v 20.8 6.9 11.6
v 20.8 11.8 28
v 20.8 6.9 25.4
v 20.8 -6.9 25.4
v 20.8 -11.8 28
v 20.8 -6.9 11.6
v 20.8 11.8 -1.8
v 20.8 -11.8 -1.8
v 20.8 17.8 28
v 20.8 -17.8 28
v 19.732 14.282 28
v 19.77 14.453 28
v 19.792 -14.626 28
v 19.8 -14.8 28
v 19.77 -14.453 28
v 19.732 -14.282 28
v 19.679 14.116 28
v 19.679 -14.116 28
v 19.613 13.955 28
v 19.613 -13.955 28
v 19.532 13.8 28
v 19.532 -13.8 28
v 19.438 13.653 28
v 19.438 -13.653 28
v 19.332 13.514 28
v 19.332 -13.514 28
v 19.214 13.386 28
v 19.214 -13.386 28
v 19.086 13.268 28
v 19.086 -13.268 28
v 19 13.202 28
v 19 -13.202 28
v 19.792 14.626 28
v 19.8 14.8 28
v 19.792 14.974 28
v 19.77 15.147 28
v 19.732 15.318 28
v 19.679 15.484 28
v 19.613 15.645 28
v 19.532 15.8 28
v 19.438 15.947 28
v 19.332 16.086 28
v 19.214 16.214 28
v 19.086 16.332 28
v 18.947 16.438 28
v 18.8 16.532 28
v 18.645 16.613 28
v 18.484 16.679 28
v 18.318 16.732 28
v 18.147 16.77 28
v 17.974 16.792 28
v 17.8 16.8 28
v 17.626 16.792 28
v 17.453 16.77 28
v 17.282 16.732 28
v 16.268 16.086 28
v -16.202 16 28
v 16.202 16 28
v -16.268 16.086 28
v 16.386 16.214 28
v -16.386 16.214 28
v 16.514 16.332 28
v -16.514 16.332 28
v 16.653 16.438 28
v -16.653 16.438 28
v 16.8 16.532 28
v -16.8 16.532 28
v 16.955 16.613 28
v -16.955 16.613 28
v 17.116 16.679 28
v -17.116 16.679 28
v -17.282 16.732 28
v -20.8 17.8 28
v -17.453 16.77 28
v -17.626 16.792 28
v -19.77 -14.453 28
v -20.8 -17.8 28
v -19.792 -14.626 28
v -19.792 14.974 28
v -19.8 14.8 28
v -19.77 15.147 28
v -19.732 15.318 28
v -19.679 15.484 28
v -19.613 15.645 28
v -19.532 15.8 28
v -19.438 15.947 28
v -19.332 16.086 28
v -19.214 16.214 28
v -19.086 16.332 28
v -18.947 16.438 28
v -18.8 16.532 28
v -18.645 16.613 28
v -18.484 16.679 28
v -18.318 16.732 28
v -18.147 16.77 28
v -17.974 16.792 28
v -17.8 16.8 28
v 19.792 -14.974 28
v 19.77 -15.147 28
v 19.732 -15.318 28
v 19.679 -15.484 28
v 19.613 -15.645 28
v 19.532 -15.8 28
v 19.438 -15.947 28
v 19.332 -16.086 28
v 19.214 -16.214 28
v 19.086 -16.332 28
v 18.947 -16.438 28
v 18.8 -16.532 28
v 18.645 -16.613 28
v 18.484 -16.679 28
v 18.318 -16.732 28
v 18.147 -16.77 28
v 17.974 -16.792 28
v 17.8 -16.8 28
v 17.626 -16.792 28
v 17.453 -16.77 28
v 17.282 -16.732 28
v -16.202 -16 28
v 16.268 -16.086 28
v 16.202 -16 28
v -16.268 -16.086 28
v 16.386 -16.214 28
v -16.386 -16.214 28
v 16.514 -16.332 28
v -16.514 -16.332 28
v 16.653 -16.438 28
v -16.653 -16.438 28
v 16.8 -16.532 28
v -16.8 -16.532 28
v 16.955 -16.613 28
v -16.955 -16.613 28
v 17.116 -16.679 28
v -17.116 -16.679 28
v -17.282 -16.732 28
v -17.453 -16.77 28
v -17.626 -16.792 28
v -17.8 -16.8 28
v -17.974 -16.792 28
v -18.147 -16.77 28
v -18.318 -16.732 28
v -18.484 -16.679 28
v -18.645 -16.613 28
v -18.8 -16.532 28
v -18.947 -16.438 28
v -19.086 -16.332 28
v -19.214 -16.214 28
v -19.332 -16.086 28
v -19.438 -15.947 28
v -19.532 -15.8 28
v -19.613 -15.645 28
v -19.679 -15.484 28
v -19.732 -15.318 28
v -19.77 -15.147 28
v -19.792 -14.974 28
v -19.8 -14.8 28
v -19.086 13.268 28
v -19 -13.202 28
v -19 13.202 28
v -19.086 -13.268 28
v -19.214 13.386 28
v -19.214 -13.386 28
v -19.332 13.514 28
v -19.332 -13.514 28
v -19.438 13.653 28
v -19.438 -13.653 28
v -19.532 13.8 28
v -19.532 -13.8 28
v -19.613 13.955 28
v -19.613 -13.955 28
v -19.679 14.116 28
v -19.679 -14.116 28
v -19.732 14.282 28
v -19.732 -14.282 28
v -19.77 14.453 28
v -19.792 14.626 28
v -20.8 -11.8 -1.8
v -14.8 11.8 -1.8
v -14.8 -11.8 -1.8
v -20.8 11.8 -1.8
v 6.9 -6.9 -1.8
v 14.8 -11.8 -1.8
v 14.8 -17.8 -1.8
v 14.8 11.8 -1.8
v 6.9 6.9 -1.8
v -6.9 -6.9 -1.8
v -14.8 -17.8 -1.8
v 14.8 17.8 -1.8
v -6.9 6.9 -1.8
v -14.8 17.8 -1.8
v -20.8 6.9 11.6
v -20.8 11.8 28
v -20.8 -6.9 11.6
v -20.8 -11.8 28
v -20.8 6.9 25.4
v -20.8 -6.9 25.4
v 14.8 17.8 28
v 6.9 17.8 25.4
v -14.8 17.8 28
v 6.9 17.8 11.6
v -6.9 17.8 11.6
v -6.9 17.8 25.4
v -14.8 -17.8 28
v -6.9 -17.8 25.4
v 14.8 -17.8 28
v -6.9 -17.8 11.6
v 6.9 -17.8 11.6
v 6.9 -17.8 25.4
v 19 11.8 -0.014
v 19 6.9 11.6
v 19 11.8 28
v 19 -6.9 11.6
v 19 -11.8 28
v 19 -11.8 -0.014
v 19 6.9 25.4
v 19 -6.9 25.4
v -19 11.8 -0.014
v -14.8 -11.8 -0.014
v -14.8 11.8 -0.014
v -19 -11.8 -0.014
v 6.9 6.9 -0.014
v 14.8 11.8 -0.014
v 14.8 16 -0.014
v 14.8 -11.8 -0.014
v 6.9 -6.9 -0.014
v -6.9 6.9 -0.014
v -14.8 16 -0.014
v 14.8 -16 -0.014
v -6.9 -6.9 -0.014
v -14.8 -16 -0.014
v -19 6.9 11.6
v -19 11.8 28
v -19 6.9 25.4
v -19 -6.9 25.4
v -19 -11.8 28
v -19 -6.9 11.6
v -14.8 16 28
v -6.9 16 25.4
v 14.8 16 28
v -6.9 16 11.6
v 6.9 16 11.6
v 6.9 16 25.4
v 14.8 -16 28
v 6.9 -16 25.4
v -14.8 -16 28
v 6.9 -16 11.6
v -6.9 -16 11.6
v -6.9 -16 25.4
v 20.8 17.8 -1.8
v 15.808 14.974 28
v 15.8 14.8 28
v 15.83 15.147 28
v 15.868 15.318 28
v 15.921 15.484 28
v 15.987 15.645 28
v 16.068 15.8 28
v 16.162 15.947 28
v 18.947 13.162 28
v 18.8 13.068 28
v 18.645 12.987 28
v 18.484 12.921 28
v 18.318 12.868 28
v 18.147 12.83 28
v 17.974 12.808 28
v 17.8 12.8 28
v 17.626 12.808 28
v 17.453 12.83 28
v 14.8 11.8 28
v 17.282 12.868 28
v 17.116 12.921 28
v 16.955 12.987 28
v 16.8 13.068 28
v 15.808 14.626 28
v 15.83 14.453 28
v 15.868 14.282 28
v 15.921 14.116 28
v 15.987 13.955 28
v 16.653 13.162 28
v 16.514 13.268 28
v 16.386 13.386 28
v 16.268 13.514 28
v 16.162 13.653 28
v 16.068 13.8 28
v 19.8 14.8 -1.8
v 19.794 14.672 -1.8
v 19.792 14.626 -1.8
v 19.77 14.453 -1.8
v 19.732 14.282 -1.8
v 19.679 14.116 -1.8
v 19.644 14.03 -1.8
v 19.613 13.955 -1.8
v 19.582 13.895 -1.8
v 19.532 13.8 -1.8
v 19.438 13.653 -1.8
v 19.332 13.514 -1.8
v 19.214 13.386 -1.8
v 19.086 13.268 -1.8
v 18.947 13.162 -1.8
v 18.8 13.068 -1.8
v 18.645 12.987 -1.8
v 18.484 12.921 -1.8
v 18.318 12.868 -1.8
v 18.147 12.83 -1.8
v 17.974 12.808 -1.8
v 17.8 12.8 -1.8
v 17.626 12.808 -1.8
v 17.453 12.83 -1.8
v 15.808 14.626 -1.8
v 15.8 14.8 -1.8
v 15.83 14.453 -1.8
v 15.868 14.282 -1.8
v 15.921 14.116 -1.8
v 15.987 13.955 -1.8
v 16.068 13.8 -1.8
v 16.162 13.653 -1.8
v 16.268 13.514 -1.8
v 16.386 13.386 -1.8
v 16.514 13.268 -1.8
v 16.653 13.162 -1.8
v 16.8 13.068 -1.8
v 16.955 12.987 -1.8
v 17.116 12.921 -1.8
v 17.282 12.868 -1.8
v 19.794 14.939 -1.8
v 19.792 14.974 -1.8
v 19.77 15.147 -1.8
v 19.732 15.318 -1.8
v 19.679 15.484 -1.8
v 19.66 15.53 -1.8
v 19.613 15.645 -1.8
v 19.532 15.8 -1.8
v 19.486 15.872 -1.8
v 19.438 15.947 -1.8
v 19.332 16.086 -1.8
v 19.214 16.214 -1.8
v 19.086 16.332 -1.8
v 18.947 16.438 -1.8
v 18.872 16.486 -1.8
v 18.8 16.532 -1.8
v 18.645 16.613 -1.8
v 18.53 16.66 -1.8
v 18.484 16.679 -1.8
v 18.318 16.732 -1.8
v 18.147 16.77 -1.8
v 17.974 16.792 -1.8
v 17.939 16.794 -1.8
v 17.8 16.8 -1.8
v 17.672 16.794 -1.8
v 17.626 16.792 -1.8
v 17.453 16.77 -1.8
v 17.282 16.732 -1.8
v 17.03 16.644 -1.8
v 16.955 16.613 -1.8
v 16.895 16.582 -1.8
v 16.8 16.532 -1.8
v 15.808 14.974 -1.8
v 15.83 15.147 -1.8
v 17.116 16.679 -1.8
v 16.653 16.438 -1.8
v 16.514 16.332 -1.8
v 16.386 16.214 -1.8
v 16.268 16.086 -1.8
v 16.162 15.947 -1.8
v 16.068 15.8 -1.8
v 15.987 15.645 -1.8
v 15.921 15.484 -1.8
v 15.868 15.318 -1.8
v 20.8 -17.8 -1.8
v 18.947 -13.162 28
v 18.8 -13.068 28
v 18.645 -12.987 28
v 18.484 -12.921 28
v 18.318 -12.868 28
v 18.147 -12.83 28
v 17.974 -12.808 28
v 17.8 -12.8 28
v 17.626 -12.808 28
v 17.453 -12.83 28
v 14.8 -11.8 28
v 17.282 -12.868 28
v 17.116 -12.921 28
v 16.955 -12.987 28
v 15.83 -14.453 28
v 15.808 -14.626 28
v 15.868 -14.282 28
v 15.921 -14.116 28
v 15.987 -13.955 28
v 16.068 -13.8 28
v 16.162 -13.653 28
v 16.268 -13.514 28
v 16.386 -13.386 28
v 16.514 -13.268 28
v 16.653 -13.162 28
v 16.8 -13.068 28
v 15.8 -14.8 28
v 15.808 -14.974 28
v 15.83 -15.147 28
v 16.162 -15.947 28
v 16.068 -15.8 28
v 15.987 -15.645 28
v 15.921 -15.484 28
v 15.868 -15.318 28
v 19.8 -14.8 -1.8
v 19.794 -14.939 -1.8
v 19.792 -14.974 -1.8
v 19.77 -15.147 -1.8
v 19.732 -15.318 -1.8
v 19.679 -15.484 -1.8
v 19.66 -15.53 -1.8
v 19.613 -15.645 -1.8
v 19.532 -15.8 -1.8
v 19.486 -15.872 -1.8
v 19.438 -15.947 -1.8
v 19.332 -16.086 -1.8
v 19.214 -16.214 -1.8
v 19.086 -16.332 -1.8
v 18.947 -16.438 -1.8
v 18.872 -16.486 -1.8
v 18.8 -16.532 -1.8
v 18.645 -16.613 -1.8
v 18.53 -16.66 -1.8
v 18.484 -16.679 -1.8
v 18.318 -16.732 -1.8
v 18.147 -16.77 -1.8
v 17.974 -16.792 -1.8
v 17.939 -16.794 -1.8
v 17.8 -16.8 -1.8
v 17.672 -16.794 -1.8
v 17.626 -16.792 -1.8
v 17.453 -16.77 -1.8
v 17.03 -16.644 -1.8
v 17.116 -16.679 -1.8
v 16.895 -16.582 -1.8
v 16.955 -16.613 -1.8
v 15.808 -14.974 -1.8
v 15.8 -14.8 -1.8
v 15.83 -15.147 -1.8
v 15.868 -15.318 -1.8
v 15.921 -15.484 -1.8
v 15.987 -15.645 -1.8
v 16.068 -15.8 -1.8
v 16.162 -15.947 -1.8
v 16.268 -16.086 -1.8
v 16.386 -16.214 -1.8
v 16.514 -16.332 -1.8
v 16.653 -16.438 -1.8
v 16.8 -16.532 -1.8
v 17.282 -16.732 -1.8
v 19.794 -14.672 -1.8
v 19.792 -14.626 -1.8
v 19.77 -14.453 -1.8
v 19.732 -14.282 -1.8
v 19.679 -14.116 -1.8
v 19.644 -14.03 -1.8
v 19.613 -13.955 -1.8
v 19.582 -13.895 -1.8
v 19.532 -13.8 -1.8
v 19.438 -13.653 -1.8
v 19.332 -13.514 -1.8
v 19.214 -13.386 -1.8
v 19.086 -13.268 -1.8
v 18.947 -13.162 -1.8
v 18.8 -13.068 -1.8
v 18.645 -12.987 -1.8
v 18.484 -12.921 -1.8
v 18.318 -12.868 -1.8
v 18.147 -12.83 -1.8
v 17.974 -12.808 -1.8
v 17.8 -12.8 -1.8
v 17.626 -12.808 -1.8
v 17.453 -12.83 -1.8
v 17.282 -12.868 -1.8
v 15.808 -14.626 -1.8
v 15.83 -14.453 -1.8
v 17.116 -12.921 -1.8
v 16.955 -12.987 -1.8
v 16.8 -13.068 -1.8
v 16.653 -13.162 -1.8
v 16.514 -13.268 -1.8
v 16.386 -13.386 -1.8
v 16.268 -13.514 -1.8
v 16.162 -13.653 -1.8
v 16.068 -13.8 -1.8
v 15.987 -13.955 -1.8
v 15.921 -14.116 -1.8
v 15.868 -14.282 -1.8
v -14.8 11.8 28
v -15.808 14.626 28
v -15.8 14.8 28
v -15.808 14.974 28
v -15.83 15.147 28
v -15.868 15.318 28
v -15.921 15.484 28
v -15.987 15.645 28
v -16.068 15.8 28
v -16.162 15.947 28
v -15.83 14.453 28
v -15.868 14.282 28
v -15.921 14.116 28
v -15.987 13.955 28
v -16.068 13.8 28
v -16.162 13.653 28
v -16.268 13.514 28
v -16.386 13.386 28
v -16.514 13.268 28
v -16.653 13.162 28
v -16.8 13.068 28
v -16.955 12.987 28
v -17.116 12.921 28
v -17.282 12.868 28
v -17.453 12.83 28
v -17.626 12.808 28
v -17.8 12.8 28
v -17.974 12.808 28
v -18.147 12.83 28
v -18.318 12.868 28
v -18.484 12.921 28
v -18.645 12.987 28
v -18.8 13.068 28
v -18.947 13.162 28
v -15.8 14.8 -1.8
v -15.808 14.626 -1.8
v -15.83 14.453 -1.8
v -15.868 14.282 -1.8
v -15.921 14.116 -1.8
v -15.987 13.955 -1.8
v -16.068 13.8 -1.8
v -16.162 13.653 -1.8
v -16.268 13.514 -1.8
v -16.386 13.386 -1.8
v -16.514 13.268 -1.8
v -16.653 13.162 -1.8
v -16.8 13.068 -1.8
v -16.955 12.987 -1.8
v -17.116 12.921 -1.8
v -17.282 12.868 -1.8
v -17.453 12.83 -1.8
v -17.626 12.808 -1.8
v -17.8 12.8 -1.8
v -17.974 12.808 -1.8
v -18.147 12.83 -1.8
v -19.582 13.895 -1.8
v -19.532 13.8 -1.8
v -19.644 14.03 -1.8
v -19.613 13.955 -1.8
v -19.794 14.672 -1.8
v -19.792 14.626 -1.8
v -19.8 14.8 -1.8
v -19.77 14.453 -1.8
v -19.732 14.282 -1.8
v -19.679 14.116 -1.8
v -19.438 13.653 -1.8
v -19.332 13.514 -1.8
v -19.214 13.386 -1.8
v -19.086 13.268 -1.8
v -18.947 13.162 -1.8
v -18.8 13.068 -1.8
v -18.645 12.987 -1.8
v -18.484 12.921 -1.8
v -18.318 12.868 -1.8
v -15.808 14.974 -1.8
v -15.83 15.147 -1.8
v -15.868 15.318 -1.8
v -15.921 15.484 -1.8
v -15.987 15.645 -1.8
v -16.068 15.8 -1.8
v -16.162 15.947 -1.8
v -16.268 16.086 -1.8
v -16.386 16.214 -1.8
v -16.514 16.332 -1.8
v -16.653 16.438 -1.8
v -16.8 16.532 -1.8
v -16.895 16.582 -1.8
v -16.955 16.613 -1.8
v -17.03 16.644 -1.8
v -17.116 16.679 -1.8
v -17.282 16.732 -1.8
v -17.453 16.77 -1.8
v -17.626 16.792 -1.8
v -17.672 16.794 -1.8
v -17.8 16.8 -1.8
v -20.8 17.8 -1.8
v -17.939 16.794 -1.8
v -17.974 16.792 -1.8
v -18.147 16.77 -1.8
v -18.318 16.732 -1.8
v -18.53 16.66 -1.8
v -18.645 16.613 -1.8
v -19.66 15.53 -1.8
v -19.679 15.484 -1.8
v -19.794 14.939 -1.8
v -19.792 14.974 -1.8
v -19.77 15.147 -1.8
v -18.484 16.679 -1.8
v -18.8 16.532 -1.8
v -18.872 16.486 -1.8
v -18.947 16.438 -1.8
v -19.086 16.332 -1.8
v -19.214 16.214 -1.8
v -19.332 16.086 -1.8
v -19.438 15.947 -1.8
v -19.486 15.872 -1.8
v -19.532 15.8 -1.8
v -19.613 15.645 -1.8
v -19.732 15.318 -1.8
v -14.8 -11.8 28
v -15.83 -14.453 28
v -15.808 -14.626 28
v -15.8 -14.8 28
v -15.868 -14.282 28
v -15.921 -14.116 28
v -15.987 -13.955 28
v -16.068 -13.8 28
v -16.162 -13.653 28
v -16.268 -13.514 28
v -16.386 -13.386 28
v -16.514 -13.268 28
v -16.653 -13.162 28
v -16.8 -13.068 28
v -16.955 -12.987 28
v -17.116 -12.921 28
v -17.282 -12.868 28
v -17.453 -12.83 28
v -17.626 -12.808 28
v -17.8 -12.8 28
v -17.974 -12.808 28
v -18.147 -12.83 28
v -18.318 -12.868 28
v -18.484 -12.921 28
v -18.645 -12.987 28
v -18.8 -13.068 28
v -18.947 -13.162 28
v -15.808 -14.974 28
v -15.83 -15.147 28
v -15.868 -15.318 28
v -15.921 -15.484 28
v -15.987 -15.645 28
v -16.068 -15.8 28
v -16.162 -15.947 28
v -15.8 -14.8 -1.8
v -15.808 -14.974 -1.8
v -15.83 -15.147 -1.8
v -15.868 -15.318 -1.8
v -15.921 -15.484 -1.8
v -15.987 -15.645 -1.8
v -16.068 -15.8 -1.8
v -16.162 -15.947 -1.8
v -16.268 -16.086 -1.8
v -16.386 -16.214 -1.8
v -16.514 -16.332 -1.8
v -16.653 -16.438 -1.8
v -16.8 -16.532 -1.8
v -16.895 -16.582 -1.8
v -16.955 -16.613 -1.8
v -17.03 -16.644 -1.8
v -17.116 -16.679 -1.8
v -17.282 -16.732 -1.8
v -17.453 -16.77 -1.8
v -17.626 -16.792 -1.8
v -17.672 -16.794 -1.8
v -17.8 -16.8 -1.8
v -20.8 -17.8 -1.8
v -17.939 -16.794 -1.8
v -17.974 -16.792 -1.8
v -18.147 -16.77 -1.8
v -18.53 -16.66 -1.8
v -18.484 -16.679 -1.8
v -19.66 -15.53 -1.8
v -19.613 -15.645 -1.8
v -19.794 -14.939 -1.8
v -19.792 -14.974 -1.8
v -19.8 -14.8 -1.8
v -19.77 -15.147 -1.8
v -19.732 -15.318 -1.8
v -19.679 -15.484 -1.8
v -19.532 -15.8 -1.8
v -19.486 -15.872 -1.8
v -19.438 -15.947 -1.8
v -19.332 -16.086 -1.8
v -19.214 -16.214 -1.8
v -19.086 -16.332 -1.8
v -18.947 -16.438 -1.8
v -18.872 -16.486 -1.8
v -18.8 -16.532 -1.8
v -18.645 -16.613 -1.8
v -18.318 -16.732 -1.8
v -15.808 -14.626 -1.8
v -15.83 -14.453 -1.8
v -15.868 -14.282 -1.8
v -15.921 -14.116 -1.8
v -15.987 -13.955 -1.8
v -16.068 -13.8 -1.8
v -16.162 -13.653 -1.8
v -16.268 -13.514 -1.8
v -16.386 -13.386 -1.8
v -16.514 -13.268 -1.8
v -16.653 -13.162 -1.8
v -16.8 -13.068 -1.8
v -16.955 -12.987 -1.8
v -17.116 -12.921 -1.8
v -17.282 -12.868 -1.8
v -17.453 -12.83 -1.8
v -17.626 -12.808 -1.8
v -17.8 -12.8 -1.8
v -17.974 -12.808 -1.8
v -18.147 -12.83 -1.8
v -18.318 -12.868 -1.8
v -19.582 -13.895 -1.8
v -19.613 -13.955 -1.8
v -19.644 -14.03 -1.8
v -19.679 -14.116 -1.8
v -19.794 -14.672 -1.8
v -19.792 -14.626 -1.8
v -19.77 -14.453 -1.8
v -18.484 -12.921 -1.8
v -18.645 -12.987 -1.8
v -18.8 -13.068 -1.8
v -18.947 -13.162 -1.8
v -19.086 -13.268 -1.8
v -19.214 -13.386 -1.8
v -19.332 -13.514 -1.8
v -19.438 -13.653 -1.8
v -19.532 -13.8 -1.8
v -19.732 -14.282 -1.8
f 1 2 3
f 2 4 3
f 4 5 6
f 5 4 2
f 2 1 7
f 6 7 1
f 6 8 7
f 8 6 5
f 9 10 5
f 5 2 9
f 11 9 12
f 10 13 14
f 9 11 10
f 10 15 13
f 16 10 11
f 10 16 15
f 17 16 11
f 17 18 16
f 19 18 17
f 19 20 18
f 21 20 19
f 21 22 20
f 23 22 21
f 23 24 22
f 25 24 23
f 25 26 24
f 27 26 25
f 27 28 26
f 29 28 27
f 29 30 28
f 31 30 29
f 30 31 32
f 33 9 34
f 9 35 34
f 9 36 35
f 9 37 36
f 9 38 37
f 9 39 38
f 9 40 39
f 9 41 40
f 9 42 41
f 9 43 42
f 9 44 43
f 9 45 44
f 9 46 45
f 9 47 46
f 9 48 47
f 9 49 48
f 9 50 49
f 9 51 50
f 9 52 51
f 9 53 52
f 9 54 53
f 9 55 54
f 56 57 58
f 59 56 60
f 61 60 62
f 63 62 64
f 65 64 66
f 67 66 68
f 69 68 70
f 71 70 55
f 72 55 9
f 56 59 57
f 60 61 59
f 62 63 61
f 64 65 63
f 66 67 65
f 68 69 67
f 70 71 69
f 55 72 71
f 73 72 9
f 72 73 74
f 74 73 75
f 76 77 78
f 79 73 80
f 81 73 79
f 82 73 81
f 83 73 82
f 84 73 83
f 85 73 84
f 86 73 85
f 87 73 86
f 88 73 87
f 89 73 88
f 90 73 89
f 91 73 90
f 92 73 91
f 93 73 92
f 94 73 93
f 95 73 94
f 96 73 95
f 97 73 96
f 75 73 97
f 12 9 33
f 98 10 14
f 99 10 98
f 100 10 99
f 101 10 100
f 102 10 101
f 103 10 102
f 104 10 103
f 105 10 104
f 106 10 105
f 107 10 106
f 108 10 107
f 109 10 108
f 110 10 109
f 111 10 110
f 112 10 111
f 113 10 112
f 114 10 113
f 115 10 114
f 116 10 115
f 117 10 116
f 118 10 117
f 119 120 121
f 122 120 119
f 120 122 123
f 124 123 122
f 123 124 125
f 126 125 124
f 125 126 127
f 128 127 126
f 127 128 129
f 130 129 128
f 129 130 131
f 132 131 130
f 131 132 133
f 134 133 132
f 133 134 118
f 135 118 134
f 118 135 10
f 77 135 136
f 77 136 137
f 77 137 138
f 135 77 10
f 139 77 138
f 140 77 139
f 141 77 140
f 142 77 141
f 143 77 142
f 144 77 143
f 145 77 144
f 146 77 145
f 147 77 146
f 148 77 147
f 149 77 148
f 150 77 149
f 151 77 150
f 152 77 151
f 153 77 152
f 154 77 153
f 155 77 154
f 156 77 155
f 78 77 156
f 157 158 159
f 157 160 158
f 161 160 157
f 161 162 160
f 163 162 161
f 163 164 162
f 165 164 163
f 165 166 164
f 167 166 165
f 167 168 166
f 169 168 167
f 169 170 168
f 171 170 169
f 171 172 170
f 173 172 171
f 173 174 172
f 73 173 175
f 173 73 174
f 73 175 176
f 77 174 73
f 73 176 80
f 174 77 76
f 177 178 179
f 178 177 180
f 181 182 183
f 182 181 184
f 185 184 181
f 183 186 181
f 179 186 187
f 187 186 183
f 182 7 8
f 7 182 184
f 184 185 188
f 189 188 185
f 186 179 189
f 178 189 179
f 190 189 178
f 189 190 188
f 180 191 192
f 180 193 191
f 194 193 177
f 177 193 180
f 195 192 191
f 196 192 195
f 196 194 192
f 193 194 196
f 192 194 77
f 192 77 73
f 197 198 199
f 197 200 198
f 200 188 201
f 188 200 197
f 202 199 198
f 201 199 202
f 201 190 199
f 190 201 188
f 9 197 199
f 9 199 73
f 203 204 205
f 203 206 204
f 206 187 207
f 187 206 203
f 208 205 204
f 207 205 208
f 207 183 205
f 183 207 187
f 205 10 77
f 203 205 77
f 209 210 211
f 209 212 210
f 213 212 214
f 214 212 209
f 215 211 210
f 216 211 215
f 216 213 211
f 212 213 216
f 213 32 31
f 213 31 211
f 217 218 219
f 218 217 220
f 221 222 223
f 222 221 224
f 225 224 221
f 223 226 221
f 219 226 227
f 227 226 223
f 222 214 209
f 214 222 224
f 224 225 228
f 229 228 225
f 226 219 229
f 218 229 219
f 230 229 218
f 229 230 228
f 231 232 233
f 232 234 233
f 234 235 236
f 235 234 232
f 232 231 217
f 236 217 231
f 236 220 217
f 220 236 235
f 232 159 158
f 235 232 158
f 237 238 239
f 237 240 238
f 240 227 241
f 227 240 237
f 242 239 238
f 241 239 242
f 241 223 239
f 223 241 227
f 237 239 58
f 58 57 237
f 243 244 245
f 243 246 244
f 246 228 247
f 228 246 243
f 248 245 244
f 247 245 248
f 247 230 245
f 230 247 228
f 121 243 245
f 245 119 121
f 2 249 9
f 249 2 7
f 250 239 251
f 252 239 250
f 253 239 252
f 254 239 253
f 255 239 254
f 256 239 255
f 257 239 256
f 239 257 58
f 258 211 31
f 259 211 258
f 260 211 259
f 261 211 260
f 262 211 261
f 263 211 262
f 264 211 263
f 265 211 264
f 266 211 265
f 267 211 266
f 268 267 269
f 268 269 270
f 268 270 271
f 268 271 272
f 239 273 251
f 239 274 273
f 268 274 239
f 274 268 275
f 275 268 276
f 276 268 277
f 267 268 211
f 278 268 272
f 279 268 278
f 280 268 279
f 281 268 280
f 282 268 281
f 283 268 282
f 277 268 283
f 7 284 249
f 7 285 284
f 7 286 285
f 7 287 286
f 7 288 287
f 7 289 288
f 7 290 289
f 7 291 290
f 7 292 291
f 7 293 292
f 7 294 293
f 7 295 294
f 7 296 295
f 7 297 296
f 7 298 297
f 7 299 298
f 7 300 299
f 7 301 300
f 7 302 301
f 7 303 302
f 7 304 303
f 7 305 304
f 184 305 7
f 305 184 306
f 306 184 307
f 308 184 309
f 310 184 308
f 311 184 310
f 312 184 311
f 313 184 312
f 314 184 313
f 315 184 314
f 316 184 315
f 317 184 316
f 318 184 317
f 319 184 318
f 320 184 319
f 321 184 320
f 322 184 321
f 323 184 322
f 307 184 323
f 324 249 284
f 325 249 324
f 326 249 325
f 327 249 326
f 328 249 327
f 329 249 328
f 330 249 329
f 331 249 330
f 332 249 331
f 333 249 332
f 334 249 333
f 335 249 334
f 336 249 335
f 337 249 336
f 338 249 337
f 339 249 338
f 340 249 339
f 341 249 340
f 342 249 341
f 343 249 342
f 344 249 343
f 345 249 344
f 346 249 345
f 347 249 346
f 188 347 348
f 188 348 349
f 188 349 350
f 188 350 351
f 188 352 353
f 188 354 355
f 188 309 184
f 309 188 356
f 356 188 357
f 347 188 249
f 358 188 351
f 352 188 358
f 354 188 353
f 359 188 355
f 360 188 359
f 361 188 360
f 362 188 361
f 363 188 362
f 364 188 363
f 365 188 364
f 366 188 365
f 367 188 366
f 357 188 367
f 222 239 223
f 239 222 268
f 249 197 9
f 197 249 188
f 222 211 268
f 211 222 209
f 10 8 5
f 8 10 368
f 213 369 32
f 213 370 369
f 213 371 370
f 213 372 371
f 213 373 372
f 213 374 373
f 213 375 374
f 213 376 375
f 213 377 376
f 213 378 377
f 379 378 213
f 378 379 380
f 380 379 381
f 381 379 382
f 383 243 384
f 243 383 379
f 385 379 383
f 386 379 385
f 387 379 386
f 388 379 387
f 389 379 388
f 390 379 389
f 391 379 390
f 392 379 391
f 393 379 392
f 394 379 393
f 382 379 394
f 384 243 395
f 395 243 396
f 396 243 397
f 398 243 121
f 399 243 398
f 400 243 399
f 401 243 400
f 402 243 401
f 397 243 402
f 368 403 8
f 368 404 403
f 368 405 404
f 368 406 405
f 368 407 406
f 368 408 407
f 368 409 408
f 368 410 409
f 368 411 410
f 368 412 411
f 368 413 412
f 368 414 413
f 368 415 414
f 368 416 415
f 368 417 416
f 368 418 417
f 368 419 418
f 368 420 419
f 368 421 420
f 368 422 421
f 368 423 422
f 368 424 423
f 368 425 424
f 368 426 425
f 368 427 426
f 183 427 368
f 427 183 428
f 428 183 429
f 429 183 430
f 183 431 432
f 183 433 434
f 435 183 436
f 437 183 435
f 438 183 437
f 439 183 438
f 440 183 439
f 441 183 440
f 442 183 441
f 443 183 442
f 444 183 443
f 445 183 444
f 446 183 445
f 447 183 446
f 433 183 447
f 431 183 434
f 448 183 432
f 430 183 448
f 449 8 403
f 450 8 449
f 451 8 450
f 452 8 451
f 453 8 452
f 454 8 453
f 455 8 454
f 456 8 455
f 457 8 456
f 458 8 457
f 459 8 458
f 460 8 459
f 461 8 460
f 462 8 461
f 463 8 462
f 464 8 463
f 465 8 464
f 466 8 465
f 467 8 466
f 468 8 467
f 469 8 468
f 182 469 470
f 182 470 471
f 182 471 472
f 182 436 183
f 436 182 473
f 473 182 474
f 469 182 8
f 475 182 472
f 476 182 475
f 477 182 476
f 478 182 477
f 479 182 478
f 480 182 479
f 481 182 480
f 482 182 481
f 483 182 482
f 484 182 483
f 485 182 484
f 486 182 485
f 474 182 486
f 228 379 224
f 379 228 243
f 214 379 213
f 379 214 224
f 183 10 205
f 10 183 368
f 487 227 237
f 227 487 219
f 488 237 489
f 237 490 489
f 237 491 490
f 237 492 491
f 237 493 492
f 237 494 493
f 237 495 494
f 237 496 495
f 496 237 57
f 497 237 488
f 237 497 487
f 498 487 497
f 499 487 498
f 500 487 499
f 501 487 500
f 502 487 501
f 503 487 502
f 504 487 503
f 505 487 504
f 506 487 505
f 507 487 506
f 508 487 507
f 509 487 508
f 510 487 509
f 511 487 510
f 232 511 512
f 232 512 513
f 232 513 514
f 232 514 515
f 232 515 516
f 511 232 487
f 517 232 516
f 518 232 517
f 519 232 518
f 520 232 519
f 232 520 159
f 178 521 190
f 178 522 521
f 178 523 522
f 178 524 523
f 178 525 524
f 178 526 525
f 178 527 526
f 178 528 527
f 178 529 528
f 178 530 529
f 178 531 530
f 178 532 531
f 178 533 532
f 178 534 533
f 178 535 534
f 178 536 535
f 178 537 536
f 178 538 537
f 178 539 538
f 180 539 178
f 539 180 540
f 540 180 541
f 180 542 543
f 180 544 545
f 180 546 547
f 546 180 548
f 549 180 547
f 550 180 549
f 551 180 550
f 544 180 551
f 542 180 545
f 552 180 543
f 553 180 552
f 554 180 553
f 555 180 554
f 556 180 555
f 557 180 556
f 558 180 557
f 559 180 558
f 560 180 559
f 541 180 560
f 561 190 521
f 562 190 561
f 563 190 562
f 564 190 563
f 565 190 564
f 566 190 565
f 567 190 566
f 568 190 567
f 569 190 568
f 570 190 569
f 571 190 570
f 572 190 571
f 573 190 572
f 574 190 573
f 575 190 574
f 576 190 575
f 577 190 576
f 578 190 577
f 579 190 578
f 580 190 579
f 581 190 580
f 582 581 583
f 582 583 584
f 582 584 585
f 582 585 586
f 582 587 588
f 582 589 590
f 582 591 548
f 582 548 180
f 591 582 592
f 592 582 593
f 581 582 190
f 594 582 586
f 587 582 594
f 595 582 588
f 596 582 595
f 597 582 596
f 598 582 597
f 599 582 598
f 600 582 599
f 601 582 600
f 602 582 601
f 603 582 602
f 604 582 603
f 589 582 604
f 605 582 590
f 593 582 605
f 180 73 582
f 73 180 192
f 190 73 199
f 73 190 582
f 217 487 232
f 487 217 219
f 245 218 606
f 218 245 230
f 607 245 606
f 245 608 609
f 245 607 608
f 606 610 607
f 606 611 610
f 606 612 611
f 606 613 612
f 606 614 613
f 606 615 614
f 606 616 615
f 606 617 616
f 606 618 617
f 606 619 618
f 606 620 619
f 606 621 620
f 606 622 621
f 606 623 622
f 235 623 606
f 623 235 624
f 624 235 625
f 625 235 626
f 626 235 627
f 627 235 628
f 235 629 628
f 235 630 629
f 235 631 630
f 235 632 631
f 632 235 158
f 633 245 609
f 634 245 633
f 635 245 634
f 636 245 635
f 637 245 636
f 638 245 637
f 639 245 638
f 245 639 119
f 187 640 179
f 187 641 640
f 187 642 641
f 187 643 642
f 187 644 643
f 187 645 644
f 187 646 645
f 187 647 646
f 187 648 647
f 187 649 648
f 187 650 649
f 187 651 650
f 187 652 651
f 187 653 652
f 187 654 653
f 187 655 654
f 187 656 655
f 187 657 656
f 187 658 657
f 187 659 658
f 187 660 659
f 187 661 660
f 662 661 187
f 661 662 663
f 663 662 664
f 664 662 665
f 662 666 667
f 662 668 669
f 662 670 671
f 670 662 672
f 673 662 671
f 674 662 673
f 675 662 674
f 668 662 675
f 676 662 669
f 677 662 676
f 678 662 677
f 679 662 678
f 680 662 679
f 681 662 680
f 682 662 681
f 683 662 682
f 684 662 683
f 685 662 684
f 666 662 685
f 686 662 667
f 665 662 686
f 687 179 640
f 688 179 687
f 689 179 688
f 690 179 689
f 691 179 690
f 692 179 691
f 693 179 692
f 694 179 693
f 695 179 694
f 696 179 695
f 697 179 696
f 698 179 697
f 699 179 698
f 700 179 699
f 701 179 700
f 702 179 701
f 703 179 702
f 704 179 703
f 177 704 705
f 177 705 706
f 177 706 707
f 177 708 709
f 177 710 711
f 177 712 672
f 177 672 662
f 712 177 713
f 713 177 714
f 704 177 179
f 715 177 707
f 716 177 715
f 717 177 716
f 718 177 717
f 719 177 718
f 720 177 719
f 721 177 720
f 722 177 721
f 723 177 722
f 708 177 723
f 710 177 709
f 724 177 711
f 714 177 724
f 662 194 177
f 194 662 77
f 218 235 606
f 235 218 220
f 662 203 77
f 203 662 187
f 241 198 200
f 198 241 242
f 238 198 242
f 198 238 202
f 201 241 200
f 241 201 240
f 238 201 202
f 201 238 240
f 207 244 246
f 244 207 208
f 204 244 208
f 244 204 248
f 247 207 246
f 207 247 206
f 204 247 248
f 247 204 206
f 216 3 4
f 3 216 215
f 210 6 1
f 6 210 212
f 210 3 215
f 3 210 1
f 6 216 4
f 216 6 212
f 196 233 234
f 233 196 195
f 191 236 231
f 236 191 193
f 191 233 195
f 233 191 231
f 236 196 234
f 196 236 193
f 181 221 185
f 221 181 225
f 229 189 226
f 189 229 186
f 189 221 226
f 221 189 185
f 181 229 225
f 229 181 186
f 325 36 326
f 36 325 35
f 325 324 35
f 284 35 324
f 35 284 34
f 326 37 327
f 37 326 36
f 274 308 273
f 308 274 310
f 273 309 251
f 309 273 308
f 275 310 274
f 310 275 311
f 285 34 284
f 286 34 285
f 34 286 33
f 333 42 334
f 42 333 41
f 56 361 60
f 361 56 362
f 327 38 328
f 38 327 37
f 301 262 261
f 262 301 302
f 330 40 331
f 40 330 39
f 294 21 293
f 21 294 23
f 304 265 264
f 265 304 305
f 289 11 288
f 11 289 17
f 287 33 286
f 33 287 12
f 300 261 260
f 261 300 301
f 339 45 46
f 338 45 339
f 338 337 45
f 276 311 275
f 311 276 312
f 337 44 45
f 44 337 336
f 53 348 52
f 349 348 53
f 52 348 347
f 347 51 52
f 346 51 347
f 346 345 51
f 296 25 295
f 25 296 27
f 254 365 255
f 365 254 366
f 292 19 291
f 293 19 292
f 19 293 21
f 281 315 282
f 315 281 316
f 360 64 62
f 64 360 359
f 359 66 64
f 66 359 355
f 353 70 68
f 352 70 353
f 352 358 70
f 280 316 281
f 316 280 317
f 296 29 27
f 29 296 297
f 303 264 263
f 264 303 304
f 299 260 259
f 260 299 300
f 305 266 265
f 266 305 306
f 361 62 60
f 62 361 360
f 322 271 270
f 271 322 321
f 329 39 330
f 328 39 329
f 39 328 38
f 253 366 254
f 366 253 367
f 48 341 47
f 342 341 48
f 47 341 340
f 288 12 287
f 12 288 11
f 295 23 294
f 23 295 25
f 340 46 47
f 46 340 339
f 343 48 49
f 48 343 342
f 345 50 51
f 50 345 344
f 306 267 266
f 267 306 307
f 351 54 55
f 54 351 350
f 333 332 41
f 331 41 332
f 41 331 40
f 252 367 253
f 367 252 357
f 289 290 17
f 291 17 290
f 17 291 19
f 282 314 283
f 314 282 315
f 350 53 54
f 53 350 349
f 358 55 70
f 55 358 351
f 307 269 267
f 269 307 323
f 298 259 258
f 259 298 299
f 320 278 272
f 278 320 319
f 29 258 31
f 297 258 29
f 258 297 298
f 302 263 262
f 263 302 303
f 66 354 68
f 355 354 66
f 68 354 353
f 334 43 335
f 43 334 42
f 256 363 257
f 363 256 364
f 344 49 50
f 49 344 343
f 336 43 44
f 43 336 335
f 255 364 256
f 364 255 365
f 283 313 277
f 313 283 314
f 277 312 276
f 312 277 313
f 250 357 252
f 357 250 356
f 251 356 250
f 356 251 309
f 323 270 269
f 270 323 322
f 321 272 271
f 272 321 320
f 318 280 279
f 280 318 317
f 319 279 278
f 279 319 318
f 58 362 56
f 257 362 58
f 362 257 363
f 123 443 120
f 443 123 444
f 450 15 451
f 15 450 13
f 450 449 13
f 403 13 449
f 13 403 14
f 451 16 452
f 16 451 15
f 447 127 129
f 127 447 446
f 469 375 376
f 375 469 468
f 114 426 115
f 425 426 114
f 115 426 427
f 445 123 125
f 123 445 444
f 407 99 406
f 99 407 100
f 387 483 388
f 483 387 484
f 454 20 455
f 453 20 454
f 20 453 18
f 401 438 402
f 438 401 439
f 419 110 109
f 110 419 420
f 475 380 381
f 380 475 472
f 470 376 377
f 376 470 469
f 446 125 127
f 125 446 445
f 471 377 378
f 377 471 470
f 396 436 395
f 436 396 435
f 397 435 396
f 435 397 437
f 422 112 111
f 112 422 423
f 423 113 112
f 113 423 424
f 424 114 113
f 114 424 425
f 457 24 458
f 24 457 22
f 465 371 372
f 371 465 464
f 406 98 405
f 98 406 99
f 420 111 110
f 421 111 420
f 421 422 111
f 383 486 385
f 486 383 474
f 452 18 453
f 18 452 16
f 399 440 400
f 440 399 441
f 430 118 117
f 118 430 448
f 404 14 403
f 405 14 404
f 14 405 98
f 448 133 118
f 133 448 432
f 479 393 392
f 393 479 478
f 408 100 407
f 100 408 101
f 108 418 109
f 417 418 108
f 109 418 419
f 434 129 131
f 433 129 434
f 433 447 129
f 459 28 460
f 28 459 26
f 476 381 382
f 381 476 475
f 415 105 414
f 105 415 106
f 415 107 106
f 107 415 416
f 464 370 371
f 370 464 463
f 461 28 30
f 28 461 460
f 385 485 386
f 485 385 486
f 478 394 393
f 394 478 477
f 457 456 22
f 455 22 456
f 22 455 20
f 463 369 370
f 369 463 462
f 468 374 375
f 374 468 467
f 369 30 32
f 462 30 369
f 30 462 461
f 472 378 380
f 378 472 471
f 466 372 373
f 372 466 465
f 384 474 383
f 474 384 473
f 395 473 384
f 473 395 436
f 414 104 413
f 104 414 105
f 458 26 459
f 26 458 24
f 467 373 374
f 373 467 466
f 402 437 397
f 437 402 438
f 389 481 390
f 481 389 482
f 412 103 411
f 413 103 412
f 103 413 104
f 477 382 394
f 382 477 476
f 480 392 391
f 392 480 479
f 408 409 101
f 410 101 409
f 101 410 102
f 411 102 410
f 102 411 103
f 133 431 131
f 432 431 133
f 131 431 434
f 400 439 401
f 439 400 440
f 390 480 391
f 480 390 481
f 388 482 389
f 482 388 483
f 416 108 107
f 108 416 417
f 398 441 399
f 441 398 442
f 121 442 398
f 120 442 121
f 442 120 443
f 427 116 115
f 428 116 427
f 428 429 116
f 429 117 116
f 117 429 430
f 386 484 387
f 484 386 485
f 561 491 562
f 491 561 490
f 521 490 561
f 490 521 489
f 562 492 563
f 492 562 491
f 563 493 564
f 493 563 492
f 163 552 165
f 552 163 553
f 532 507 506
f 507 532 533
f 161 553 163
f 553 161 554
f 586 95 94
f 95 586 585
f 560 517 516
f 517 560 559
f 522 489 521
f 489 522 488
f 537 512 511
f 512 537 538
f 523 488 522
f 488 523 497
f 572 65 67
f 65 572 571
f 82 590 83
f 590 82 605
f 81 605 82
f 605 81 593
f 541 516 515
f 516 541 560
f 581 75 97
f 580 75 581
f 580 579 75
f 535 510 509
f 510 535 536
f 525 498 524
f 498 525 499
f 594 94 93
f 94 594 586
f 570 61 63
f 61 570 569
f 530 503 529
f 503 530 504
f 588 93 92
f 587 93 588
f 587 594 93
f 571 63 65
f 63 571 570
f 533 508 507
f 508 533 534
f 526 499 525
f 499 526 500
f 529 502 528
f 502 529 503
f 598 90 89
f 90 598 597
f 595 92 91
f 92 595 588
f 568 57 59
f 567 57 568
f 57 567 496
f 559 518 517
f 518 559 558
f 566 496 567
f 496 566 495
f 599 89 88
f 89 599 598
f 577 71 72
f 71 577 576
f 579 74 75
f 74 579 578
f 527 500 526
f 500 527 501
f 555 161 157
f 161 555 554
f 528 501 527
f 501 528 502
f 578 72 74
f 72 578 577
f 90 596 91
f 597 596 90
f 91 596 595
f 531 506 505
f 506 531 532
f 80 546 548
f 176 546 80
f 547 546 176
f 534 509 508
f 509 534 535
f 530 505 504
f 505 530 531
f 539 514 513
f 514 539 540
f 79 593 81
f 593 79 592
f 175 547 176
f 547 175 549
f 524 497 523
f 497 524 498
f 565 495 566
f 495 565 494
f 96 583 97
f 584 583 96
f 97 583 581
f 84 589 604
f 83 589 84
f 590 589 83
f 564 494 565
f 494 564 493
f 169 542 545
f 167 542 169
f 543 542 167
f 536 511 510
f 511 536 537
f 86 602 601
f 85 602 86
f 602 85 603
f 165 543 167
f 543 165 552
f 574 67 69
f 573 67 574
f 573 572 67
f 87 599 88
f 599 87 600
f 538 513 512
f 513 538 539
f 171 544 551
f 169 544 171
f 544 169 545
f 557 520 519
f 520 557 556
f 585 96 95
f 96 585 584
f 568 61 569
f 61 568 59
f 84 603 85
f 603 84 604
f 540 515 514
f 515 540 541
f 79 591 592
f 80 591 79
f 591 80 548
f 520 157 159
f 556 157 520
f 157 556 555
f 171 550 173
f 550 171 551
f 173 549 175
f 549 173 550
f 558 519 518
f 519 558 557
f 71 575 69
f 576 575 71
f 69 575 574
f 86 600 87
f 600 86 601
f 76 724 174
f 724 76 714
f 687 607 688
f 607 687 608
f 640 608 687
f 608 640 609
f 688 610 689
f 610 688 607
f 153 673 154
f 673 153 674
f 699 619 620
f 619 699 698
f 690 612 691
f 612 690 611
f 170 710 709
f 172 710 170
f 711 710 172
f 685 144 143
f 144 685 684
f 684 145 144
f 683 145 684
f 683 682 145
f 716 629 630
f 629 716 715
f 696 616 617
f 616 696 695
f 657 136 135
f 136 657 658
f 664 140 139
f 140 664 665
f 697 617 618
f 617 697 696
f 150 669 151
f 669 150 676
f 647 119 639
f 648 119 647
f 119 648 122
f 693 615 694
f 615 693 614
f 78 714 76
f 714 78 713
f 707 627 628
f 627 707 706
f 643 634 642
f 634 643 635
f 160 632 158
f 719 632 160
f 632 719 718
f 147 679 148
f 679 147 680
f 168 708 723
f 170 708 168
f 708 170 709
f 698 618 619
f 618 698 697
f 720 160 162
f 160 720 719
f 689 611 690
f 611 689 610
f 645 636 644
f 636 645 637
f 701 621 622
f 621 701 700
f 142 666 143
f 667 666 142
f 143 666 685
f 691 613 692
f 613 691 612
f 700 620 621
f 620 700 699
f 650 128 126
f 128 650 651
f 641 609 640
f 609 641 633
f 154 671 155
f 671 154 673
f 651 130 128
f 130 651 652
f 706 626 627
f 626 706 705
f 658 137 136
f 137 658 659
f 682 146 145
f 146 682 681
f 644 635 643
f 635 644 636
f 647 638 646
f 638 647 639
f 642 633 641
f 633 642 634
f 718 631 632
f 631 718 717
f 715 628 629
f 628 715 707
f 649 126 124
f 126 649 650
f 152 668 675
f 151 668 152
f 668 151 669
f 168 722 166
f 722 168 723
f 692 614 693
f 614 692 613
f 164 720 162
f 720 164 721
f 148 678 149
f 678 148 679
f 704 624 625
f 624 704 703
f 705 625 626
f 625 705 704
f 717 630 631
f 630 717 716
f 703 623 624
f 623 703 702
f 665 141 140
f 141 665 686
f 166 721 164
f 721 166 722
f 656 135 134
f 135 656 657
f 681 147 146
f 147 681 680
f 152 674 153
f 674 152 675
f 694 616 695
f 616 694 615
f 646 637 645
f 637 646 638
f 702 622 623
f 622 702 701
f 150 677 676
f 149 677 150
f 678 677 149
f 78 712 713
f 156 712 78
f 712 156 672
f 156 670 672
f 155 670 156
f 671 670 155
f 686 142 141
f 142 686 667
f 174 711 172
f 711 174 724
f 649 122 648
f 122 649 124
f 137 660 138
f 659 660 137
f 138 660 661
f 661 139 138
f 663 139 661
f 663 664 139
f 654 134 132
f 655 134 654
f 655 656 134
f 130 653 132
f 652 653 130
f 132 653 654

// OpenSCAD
$fn = 72;
SS = 13.8;
KEYCAP_SIZE=19;
THICK = 1.8;
TOP_THICK=2.5;

FINGER_AREA_WIDTH = 20;
FINGER_AREA_DEPTH = 14;

SWITCH_AREA_SIZE = 9;

INN_WIDTH = SWITCH_AREA_SIZE + FINGER_AREA_WIDTH + SWITCH_AREA_SIZE;
INN_DEPTH = SWITCH_AREA_SIZE + FINGER_AREA_DEPTH + SWITCH_AREA_SIZE;
INN_HEIGHT = SWITCH_AREA_SIZE + KEYCAP_SIZE;

OUT_WIDTH = THICK + INN_WIDTH + THICK;
OUT_DEPTH = THICK + INN_DEPTH + THICK;
OUT_HEIGHT = THICK + INN_HEIGHT;

MID_X = (INN_WIDTH + THICK)/2;
MID_Y = (INN_DEPTH + THICK)/2;
MID_Z = INN_HEIGHT/2;
MID_PLATE = -THICK/2;

MOUNT_SIZE = 6;
MOUNT_X = OUT_WIDTH/2 - MOUNT_SIZE/2;
MOUNT_Y = OUT_DEPTH/2 - MOUNT_SIZE/2;


module bulk() {
  translate([0, 0, OUT_HEIGHT/2 - THICK])
  cube([OUT_WIDTH, OUT_DEPTH, OUT_HEIGHT], center = true);
}

module cavity() {
  translate([0, 0, INN_HEIGHT/2])
  cube([INN_WIDTH, INN_DEPTH, INN_HEIGHT*1.001], center = true);
}

module stand() {
  translate([0, 0, OUT_HEIGHT/2 - THICK])
  difference() {    
    cube([MOUNT_SIZE, MOUNT_SIZE, OUT_HEIGHT], center = true);
    cylinder(h = OUT_HEIGHT + 1, r = 2, center= true);
  }
}
module stand1() {
  translate([MOUNT_X, MOUNT_Y, 0]) stand();
}
module stand2() {
  translate([MOUNT_X, -MOUNT_Y, 0]) stand();
}
module stand3() {
  translate([-MOUNT_X, MOUNT_Y, 0]) stand();
}
module stand4() {
  translate([-MOUNT_X, -MOUNT_Y, 0]) stand();
}

module box() {
  difference() {
    bulk();      
    cavity();
  }
}


module base() {
  union() {
    box();  
    
    stand1();
    stand2();
    stand3();
    stand4();
  }
}


module switch_cutout_z() {  
  cube([SS, SS, THICK*1.005], center = true);
}

module switch_cutout_x() {
  translate([0, 0, SWITCH_AREA_SIZE + KEYCAP_SIZE/2])
  color("red") cube([SS, THICK*1.005, SS], center = true);
}

module switch_cutout_y() {
  translate([0, 0, SWITCH_AREA_SIZE + KEYCAP_SIZE/2])
  color("red") cube([THICK*1.005, SS, SS], center = true);
}


module mount_hole() {
  translate([0, 0, OUT_HEIGHT/2 - THICK])
  cylinder(h = OUT_HEIGHT*1.005, r = 2, center= true);
}


module part() {
  difference() {
    base();
    
    translate([0, MID_Y, 0]) switch_cutout_x();
    translate([0, -MID_Y, 0]) switch_cutout_x();
    translate([MID_X, 0, 0]) switch_cutout_y();
    translate([-MID_X, 0, 0]) switch_cutout_y();
    translate([0, 0, MID_PLATE]) switch_cutout_z();
    
    translate([MOUNT_X, MOUNT_Y, 0]) mount_hole();
    translate([MOUNT_X, -MOUNT_Y, 0]) mount_hole();
    translate([-MOUNT_X, MOUNT_Y, 0]) mount_hole();
    translate([-MOUNT_X, -MOUNT_Y, 0]) mount_hole();
  }
}

part();
